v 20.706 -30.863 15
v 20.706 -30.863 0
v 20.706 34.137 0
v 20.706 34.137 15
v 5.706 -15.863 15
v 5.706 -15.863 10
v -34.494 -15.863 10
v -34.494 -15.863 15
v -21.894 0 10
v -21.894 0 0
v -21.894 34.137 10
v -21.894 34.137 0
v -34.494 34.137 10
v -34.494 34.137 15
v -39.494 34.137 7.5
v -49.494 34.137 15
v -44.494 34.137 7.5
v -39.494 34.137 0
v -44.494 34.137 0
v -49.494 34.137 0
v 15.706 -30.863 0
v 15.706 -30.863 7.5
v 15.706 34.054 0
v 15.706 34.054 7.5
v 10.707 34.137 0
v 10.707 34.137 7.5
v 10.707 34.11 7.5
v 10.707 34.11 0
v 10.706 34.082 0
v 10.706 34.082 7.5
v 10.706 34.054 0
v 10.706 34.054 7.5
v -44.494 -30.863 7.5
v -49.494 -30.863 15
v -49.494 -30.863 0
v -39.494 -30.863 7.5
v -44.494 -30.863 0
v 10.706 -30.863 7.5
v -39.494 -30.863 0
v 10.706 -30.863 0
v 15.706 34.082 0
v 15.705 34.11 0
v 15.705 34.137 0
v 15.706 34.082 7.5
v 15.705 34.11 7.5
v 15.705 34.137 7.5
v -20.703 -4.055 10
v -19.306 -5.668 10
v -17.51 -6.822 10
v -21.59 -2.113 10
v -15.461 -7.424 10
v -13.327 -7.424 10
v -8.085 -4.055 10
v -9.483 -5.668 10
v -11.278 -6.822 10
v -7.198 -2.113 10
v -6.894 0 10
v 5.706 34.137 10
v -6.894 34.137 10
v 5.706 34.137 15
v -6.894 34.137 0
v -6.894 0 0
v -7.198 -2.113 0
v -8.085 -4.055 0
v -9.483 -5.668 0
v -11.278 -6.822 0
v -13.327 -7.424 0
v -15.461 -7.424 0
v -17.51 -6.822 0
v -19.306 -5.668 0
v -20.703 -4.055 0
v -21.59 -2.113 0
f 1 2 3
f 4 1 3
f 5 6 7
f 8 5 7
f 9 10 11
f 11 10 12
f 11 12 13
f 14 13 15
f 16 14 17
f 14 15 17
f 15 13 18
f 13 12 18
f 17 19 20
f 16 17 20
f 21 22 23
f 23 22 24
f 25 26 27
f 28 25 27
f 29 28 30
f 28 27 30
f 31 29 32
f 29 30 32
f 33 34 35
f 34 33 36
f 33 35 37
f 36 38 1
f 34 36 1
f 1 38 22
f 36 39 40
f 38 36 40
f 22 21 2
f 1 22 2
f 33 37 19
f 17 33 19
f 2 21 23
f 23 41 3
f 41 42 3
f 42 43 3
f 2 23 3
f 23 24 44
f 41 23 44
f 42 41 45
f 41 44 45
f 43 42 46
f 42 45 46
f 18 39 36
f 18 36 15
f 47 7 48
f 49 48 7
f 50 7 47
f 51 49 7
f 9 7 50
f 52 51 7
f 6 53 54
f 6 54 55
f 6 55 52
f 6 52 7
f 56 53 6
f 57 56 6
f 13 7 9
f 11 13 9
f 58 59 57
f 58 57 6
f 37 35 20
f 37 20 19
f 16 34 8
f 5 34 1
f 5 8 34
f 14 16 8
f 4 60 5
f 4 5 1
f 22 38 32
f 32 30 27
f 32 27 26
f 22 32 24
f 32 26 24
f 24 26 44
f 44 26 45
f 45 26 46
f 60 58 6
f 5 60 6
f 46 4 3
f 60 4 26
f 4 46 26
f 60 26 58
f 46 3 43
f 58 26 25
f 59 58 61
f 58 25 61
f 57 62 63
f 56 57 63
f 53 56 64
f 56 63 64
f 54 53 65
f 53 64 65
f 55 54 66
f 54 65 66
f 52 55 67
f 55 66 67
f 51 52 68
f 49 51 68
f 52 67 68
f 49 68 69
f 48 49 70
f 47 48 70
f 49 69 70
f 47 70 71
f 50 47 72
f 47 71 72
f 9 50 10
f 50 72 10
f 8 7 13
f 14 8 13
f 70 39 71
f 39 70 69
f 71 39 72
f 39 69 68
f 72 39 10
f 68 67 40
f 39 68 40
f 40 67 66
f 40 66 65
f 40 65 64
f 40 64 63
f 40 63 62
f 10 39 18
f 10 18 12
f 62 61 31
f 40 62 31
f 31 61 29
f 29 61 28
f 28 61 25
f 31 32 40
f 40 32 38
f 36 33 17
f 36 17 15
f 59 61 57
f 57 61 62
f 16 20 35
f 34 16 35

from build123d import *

# Parameters (mm, degrees)
F1_DEPTH = 15
F2_DEPTH = 10
F3_W     = 2.5
F3_H     = 65
F4_DEPTH = 7.5


with BuildPart() as f1:
    # F0 (on Top) → F1 (new body)
    with BuildSketch(Plane.XY):
        Polygon((-34.4940570078, 34.1372138634), (-49.4940570078, 34.1372138634), (-49.4940570078, -30.8627861366), (20.7059429922, -30.8627861366), (20.7059429922, 34.1372138634), (5.7059429922, 34.1372138634), (5.7059429922, -15.8627861366), (-34.4940570078, -15.8627861366), align=None)
    extrude(amount=F1_DEPTH)

    # F0 (on Top) → F2 (join)
    with BuildSketch(Plane.XY):
        Polygon((-34.4940570078, 34.1372138634), (-49.4940570078, 34.1372138634), (-49.4940570078, -30.8627861366), (20.7059429922, -30.8627861366), (20.7059429922, 34.1372138634), (5.7059429922, 34.1372138634), (5.7059429922, -15.8627861366), (-34.4940570078, -15.8627861366), align=None)
        with BuildLine():
            Line((-21.8940570078, 34.1372138634), (-34.4940570078, 34.1372138634))
            Line((-34.4940570078, 34.1372138634), (-34.4940570078, -15.8627861366))
            Line((-34.4940570078, -15.8627861366), (5.7059429922, -15.8627861366))
            Line((5.7059429922, -15.8627861366), (5.7059429922, 34.1372138634))
            Line((5.7059429922, 34.1372138634), (-6.8940570078, 34.1372138634))
            Line((-6.8940570078, 34.1372138634), (-6.8940570078, 0))
            ThreePointArc((-6.8940570078, 0), (-14.3940570078, -7.5), (-21.8940570078, 0))
            Line((-21.8940570078, 0), (-21.8940570078, 34.1372138634))
        make_face()
    extrude(amount=F2_DEPTH)

    # F3 (on face) → F4 (cut, symmetric)
    with BuildSketch(Plane.XY):
        with Locations((-43.2440570078, 1.6372138634)):
            Rectangle(F3_W, F3_H)
        with Locations((-40.7440570078, 1.6372138634)):
            Rectangle(F3_W, F3_H)
        with BuildLine():
            Line((10.7059429922, 34.05405581), (10.7059429922, -30.8627861366))
            Line((10.7059429922, -30.8627861366), (13.2059429922, -30.8627861366))
            Line((13.2059429922, -30.8627861366), (15.7059429922, -30.8627861366))
            Line((15.7059429922, -30.8627861366), (15.7059429922, 34.05405581))
            ThreePointArc((15.7059429922, 34.05405581), (15.7055971095, 34.0956405901), (15.7045595571, 34.1372138634))
            Line((15.7045595571, 34.1372138634), (10.7073264274, 34.1372138634))
            ThreePointArc((10.7073264274, 34.1372138634), (10.7062888749, 34.0956405901), (10.7059429922, 34.05405581))
        make_face()
    extrude(amount=F4_DEPTH, both=True, mode=Mode.SUBTRACT)


solid = f1.part
